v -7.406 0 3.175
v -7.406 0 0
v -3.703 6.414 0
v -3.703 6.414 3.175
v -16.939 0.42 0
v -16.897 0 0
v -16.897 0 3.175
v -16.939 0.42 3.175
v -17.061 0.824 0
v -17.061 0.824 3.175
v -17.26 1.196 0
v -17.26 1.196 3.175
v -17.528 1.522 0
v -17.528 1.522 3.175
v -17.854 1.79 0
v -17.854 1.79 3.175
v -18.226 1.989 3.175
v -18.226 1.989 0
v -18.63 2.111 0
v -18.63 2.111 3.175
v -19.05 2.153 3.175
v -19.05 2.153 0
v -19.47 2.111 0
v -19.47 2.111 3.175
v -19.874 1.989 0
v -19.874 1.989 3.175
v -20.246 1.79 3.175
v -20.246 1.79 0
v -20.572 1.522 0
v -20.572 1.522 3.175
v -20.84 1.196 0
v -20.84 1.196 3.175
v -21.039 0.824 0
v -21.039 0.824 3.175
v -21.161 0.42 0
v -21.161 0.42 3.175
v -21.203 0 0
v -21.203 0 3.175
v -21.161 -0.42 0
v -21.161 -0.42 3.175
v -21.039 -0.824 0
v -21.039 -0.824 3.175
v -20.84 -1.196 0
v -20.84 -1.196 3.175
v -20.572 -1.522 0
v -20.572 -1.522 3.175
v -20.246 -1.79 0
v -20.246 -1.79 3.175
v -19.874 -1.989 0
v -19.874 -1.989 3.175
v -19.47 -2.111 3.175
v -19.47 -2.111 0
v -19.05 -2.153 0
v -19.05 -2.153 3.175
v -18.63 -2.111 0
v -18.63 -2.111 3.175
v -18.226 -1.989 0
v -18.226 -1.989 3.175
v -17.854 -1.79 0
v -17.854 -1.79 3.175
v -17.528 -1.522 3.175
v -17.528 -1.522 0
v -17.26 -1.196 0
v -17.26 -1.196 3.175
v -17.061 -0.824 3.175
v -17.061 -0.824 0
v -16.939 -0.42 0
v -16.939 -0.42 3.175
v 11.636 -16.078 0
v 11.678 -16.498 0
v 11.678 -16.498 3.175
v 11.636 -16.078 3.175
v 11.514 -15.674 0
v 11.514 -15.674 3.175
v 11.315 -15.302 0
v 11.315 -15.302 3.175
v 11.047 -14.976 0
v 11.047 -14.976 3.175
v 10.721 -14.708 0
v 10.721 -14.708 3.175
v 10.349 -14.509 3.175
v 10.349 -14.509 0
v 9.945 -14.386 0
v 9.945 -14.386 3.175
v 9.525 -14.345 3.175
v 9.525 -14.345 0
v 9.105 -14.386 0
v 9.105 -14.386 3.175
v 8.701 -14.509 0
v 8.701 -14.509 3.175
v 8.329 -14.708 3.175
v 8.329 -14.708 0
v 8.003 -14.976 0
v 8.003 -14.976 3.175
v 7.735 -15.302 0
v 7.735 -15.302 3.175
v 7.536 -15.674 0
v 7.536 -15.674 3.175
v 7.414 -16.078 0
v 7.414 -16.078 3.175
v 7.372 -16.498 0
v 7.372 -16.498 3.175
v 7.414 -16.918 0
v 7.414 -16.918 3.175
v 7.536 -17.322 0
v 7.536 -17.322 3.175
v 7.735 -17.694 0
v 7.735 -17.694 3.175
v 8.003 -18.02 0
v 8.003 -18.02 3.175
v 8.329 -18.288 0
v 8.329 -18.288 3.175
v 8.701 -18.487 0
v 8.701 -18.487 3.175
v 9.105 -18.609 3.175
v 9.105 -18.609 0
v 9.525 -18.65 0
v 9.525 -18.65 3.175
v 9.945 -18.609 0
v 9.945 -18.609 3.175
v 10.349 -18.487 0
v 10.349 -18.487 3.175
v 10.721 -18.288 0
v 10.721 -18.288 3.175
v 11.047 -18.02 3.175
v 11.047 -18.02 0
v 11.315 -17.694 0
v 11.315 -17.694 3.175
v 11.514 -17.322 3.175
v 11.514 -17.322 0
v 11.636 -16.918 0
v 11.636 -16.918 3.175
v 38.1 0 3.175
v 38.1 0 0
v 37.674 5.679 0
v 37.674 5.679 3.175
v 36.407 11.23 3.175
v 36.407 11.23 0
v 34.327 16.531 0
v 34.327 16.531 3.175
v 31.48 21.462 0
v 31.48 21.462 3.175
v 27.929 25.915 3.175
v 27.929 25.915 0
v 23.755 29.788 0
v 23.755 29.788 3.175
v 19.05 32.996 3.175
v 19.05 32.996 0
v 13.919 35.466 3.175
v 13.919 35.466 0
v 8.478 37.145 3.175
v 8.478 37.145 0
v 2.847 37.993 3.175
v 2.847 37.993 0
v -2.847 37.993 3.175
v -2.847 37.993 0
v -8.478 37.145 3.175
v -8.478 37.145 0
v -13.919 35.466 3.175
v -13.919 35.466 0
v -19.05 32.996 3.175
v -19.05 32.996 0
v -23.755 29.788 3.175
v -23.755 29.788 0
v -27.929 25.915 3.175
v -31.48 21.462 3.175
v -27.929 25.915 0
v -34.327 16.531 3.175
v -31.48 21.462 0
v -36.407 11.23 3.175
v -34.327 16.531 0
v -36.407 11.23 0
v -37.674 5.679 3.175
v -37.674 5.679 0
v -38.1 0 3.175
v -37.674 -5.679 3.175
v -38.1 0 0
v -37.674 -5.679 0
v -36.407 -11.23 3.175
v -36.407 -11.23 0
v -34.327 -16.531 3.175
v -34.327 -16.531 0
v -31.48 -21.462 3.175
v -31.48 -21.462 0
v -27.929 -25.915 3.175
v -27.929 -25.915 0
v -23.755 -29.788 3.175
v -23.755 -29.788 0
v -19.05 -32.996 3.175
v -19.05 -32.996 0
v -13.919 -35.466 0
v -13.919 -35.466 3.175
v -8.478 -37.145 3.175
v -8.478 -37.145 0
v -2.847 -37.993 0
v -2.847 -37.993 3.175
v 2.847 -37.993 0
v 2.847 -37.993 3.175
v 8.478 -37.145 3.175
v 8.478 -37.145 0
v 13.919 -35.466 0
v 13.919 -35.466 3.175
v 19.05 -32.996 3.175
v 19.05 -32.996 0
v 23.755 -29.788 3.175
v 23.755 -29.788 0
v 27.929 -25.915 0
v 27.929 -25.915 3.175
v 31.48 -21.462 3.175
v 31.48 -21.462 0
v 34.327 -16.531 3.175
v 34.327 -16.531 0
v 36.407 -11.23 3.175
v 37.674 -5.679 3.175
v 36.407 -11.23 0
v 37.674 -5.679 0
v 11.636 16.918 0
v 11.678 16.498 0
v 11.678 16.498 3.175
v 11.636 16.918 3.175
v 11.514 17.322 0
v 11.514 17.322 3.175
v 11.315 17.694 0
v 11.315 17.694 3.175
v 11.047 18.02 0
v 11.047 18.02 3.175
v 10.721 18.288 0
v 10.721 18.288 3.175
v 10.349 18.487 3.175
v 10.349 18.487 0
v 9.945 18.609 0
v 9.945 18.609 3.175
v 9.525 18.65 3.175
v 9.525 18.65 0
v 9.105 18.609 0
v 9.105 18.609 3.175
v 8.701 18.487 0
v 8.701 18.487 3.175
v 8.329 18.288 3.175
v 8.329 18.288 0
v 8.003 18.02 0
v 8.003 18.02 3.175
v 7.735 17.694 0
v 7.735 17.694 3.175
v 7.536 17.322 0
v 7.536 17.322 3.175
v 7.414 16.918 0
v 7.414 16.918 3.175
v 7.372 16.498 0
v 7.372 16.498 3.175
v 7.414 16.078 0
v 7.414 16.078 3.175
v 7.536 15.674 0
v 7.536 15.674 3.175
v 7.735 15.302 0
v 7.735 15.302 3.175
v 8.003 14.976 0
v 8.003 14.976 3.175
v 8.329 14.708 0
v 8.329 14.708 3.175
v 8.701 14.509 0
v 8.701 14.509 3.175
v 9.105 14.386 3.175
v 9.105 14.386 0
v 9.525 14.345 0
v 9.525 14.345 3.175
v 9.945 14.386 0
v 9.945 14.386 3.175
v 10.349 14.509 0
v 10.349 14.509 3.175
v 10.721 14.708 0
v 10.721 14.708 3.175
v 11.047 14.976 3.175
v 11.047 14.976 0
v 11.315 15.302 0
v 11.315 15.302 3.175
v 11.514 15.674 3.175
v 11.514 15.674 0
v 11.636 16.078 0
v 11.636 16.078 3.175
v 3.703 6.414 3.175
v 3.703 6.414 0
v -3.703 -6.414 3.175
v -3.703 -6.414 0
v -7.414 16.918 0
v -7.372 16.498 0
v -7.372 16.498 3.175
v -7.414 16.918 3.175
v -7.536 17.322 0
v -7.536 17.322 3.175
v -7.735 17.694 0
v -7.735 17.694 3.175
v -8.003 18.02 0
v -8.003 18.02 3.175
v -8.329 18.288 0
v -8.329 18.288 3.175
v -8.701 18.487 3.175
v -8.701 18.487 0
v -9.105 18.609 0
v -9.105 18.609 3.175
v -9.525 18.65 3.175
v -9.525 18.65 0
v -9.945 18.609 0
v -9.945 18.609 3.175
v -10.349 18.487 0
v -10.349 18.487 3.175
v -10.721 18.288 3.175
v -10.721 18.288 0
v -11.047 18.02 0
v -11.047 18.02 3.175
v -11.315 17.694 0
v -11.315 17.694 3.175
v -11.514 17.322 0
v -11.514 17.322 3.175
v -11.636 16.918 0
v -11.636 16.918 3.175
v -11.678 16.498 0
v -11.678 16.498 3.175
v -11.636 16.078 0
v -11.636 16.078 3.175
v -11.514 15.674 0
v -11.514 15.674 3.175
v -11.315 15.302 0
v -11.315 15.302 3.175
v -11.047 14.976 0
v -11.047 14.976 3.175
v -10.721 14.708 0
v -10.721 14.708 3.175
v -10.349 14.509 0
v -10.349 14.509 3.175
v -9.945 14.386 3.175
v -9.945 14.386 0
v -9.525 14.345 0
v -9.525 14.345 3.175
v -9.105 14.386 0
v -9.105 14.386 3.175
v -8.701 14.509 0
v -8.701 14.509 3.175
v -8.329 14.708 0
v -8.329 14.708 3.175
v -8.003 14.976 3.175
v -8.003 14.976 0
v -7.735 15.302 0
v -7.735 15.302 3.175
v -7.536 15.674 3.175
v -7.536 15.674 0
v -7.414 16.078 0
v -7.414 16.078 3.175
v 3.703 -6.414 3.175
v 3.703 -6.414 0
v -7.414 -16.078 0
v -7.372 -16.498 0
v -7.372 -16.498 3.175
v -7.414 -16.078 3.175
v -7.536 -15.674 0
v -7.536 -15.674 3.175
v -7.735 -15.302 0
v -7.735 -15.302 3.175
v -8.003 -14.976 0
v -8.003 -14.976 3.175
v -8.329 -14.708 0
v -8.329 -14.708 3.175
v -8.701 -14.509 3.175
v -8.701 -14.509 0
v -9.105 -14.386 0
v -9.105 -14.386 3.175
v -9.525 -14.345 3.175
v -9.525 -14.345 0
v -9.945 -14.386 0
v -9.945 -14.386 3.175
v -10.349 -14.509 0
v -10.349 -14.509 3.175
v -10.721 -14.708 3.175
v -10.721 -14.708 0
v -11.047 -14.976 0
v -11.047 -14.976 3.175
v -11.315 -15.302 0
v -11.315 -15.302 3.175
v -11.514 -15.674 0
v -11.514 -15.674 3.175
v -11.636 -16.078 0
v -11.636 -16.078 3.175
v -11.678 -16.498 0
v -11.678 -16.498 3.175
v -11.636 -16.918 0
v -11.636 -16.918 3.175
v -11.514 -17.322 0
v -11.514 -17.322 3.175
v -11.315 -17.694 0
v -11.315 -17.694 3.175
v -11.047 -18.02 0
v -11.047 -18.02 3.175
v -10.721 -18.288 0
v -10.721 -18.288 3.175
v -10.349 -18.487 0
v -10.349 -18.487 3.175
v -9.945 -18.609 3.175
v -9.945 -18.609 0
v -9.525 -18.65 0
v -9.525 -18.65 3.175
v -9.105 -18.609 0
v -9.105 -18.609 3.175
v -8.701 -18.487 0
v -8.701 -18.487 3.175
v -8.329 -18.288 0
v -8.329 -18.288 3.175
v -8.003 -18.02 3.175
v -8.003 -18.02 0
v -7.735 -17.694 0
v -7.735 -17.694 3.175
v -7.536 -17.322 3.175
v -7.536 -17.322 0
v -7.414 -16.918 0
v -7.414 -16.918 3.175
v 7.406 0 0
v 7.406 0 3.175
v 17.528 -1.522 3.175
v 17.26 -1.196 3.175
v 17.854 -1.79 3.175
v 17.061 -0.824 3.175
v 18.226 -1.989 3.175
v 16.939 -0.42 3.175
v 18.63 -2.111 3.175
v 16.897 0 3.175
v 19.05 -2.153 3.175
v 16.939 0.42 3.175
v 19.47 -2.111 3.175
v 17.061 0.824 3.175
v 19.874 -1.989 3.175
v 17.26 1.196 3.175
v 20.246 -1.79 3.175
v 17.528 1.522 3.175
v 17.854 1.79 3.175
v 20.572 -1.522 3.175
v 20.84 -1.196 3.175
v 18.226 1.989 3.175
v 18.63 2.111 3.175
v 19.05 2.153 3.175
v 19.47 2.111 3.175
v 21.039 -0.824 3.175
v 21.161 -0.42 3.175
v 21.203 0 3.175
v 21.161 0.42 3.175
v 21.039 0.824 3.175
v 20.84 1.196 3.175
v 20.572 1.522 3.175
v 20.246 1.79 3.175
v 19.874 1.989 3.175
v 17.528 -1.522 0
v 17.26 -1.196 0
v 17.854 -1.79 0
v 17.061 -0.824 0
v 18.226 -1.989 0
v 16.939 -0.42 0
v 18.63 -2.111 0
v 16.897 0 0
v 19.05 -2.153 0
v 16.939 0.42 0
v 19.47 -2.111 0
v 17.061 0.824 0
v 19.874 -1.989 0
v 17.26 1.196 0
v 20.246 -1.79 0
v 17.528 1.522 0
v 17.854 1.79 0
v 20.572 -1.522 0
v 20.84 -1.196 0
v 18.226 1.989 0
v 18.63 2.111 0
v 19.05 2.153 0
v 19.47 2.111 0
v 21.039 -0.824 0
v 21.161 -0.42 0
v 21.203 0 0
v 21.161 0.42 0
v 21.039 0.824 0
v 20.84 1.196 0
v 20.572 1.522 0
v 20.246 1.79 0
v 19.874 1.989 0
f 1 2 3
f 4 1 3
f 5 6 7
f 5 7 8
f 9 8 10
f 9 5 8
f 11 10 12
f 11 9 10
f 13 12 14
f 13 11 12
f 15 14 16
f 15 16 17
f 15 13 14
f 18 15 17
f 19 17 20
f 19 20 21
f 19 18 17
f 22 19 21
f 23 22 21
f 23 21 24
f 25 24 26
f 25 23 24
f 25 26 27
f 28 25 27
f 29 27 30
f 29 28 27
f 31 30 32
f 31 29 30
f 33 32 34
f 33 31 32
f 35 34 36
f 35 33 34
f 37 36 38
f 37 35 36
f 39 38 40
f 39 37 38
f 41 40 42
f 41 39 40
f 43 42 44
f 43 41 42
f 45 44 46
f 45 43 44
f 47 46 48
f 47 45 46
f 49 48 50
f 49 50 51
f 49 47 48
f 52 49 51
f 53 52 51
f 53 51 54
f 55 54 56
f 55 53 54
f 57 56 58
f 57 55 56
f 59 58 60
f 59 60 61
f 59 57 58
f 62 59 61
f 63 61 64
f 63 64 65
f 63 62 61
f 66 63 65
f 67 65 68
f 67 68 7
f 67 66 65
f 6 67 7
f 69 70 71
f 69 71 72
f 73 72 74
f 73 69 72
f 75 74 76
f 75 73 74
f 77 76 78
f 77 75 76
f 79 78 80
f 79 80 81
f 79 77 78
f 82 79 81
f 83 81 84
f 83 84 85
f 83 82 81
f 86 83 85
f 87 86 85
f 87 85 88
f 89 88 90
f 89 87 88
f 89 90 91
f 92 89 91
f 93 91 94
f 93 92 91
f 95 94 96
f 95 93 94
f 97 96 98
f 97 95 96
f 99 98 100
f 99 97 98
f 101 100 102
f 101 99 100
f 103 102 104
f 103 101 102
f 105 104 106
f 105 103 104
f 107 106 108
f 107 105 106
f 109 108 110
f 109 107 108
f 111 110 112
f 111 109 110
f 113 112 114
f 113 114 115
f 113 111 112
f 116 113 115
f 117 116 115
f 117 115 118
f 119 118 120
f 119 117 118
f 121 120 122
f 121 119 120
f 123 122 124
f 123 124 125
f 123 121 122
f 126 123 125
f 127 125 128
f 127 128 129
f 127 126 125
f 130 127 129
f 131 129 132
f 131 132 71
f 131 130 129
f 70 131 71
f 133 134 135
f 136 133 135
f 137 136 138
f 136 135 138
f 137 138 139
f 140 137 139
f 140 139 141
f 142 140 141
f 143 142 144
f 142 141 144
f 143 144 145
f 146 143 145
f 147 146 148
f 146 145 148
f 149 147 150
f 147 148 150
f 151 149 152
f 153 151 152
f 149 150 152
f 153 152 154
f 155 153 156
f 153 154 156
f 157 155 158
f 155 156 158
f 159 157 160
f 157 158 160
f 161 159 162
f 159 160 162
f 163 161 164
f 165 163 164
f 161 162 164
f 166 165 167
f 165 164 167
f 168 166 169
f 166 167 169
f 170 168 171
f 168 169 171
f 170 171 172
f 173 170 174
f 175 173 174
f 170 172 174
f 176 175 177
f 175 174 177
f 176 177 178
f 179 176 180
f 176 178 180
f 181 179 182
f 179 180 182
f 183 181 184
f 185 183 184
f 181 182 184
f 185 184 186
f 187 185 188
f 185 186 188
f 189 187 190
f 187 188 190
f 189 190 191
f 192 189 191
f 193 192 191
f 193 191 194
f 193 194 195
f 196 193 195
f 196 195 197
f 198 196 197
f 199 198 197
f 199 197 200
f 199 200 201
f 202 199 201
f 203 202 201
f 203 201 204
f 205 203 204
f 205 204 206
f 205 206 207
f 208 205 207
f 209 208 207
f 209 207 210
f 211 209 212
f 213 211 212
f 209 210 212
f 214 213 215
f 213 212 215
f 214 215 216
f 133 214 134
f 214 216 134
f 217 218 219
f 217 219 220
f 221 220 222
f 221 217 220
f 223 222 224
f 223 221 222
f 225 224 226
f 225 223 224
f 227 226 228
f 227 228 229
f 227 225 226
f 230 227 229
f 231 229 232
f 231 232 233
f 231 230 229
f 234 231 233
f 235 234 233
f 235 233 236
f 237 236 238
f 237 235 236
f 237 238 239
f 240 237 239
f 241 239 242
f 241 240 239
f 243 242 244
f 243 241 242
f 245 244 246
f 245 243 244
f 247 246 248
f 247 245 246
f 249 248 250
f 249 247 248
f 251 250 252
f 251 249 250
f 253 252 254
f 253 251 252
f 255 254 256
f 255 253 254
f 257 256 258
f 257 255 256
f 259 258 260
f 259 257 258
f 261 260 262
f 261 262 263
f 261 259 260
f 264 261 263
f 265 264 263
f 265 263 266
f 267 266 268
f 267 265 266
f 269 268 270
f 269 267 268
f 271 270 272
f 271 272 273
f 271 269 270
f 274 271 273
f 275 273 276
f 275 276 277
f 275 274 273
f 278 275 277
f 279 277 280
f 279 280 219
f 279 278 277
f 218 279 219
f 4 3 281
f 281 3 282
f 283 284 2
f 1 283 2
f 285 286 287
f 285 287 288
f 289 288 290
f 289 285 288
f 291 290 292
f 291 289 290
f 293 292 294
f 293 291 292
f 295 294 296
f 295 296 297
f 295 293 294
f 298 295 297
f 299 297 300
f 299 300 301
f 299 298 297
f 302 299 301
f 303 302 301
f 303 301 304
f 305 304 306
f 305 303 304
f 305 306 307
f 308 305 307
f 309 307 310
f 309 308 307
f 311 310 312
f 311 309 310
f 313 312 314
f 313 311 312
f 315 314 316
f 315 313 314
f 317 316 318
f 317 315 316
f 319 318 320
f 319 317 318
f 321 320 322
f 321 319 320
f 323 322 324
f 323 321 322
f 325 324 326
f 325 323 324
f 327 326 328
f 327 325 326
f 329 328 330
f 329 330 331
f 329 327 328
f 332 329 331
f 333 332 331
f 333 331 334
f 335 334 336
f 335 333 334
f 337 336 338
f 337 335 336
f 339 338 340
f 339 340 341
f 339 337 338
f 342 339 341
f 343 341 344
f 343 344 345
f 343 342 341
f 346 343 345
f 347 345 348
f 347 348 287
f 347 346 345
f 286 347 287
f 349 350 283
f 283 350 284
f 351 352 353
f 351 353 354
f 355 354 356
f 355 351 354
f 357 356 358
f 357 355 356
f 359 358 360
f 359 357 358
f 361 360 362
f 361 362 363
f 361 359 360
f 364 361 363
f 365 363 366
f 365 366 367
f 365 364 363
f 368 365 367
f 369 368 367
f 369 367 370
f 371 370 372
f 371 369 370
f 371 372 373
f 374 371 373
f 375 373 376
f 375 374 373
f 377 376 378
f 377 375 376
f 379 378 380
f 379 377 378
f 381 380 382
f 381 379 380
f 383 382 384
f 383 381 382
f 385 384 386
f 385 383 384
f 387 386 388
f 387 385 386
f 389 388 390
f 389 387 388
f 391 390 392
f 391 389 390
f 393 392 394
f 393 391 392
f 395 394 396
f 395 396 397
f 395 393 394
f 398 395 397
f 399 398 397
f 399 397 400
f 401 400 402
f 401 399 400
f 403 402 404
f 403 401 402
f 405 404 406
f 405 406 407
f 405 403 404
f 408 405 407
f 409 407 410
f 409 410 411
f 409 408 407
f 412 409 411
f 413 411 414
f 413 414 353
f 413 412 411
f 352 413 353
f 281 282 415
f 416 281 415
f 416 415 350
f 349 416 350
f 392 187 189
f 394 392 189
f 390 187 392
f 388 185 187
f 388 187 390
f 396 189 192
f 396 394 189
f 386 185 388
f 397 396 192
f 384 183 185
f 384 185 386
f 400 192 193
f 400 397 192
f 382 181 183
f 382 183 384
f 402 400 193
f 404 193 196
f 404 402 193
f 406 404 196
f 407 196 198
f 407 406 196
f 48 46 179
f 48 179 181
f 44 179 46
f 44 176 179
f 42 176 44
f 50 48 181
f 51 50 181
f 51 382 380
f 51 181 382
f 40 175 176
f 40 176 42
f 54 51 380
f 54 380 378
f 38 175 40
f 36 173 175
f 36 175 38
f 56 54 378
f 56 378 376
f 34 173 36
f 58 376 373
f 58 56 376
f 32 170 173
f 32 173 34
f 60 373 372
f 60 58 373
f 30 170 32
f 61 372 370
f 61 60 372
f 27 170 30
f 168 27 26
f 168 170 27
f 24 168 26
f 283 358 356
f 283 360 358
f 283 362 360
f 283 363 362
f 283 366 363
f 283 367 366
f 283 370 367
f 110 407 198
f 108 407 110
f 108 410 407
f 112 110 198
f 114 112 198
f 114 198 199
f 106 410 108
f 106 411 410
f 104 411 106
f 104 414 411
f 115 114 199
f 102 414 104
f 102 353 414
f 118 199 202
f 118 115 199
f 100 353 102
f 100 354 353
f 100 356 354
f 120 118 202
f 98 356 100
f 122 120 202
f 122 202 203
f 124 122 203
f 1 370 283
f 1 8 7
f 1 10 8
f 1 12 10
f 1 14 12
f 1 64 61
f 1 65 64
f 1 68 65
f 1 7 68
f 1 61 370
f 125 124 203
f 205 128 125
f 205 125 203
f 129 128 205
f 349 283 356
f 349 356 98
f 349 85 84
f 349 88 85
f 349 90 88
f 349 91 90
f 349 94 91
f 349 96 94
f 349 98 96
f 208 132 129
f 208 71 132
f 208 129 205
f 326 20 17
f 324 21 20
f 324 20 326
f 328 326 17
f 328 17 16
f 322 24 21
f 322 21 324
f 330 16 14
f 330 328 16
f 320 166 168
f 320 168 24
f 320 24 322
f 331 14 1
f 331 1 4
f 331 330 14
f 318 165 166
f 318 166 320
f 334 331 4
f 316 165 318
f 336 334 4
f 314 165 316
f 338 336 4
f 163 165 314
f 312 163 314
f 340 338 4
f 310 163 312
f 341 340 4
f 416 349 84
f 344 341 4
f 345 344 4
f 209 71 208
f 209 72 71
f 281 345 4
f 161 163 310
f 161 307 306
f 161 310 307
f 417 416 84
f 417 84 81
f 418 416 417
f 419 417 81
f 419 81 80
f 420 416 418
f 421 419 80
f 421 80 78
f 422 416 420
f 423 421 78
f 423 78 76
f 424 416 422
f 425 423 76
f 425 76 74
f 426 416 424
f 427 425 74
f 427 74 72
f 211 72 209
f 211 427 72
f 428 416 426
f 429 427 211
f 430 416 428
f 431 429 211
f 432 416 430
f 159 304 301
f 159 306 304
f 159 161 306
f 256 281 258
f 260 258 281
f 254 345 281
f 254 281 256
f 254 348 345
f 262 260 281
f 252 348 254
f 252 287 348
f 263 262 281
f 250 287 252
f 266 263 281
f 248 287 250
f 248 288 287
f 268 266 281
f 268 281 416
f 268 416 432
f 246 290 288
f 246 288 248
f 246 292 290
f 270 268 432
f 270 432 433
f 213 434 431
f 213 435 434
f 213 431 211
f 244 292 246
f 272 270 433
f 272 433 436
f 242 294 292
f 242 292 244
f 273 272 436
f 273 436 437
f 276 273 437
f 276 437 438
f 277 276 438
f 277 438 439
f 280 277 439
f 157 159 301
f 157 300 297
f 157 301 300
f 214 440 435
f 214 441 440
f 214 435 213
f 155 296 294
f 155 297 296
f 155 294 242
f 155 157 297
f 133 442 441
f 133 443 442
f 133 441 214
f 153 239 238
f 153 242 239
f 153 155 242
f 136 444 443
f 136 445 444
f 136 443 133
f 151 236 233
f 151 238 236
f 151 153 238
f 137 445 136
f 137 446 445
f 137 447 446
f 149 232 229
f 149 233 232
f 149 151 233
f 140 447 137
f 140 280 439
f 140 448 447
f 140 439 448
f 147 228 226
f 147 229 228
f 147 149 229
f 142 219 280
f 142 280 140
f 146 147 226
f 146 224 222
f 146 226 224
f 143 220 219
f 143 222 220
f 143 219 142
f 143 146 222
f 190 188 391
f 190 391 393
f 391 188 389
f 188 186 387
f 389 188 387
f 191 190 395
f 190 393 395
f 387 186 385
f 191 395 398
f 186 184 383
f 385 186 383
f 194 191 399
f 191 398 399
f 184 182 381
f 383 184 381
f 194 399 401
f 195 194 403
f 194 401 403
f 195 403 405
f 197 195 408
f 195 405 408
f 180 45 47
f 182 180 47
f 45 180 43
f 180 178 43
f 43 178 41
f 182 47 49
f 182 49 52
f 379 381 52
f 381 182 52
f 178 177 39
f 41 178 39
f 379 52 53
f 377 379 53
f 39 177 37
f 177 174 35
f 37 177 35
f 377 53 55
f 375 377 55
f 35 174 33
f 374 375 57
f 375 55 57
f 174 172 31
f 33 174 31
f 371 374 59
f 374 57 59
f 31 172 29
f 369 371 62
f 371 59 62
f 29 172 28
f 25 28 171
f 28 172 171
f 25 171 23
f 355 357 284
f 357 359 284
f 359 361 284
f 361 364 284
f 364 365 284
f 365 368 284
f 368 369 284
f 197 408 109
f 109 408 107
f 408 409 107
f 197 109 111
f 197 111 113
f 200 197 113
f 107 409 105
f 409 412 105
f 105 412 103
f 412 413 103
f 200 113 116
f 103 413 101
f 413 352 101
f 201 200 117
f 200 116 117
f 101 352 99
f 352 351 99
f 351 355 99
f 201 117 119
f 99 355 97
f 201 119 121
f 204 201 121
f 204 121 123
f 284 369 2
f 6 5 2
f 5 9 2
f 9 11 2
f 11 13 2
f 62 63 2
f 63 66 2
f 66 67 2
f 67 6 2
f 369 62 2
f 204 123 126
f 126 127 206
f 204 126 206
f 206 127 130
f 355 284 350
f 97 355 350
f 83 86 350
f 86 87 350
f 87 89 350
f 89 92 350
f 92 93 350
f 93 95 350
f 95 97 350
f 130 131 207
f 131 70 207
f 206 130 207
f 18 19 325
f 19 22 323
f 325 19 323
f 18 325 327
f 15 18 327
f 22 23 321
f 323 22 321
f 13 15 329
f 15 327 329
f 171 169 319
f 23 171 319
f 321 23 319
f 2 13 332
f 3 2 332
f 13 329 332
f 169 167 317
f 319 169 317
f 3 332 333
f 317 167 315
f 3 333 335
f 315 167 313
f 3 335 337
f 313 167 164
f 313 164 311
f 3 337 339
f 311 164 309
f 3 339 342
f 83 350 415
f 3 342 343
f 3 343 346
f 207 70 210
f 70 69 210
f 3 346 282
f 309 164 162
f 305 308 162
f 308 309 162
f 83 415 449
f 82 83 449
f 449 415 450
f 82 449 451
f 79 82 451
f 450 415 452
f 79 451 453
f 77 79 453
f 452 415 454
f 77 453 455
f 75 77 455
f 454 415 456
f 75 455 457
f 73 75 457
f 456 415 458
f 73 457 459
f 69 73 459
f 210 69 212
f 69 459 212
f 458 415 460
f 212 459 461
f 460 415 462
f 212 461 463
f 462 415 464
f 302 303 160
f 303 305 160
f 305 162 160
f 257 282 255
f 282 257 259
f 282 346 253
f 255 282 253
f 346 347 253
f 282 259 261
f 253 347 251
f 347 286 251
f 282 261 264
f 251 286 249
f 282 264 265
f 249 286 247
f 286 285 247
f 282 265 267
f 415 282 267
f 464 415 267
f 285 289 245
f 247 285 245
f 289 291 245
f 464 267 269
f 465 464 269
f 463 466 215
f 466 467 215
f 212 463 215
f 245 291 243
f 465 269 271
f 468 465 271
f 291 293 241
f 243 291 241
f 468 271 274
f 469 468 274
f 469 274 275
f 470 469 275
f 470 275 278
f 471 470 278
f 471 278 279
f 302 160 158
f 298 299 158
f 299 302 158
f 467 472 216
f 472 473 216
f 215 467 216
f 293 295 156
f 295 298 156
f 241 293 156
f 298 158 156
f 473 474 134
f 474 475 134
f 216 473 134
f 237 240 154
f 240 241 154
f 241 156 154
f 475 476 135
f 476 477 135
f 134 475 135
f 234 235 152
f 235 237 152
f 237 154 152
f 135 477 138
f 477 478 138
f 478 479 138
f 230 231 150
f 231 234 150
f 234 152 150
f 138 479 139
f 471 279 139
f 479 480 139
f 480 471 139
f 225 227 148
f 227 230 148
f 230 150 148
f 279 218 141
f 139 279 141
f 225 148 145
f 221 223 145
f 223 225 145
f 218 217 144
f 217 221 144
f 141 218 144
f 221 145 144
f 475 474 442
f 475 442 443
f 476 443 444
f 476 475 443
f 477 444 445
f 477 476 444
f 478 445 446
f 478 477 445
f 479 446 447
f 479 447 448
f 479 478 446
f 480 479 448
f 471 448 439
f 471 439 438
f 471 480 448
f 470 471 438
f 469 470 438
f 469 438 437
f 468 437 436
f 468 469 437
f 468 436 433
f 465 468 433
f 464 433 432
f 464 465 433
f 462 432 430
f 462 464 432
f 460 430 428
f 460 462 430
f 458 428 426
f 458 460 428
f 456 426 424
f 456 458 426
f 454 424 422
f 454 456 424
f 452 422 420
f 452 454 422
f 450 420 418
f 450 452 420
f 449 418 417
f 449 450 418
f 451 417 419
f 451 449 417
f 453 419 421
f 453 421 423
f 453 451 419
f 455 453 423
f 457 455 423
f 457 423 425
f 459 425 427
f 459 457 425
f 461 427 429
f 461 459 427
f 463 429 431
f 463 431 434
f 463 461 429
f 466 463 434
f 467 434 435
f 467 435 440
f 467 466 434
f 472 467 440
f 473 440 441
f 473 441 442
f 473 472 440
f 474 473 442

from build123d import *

# Parameters (mm, degrees)
F0_R     = 38.1
F0_R_2   = 2.15265
F1_DEPTH = 3.175


with BuildPart() as f1:
    # F0 (on Top) → F1 (new body)
    with BuildSketch(Plane.XY):
        Circle(F0_R)
        with Locations((-9.525, -16.497784)):
            Circle(F0_R_2, mode=Mode.SUBTRACT)
        with Locations((9.525, -16.497784)):
            Circle(F0_R_2, mode=Mode.SUBTRACT)
        with Locations((-19.05, 0)):
            Circle(F0_R_2, mode=Mode.SUBTRACT)
        with Locations((-9.525, 16.497784)):
            Circle(F0_R_2, mode=Mode.SUBTRACT)
        Polygon((7.405672, 0), (3.702836, -6.4135), (-3.702836, -6.4135), (-7.405672, 0), (-3.702836, 6.4135), (3.702836, 6.4135), align=None, mode=Mode.SUBTRACT)
        with Locations((9.525, 16.497784)):
            Circle(F0_R_2, mode=Mode.SUBTRACT)
        with Locations((19.05, 0)):
            Circle(F0_R_2, mode=Mode.SUBTRACT)
    extrude(amount=F1_DEPTH)


solid = f1.part
